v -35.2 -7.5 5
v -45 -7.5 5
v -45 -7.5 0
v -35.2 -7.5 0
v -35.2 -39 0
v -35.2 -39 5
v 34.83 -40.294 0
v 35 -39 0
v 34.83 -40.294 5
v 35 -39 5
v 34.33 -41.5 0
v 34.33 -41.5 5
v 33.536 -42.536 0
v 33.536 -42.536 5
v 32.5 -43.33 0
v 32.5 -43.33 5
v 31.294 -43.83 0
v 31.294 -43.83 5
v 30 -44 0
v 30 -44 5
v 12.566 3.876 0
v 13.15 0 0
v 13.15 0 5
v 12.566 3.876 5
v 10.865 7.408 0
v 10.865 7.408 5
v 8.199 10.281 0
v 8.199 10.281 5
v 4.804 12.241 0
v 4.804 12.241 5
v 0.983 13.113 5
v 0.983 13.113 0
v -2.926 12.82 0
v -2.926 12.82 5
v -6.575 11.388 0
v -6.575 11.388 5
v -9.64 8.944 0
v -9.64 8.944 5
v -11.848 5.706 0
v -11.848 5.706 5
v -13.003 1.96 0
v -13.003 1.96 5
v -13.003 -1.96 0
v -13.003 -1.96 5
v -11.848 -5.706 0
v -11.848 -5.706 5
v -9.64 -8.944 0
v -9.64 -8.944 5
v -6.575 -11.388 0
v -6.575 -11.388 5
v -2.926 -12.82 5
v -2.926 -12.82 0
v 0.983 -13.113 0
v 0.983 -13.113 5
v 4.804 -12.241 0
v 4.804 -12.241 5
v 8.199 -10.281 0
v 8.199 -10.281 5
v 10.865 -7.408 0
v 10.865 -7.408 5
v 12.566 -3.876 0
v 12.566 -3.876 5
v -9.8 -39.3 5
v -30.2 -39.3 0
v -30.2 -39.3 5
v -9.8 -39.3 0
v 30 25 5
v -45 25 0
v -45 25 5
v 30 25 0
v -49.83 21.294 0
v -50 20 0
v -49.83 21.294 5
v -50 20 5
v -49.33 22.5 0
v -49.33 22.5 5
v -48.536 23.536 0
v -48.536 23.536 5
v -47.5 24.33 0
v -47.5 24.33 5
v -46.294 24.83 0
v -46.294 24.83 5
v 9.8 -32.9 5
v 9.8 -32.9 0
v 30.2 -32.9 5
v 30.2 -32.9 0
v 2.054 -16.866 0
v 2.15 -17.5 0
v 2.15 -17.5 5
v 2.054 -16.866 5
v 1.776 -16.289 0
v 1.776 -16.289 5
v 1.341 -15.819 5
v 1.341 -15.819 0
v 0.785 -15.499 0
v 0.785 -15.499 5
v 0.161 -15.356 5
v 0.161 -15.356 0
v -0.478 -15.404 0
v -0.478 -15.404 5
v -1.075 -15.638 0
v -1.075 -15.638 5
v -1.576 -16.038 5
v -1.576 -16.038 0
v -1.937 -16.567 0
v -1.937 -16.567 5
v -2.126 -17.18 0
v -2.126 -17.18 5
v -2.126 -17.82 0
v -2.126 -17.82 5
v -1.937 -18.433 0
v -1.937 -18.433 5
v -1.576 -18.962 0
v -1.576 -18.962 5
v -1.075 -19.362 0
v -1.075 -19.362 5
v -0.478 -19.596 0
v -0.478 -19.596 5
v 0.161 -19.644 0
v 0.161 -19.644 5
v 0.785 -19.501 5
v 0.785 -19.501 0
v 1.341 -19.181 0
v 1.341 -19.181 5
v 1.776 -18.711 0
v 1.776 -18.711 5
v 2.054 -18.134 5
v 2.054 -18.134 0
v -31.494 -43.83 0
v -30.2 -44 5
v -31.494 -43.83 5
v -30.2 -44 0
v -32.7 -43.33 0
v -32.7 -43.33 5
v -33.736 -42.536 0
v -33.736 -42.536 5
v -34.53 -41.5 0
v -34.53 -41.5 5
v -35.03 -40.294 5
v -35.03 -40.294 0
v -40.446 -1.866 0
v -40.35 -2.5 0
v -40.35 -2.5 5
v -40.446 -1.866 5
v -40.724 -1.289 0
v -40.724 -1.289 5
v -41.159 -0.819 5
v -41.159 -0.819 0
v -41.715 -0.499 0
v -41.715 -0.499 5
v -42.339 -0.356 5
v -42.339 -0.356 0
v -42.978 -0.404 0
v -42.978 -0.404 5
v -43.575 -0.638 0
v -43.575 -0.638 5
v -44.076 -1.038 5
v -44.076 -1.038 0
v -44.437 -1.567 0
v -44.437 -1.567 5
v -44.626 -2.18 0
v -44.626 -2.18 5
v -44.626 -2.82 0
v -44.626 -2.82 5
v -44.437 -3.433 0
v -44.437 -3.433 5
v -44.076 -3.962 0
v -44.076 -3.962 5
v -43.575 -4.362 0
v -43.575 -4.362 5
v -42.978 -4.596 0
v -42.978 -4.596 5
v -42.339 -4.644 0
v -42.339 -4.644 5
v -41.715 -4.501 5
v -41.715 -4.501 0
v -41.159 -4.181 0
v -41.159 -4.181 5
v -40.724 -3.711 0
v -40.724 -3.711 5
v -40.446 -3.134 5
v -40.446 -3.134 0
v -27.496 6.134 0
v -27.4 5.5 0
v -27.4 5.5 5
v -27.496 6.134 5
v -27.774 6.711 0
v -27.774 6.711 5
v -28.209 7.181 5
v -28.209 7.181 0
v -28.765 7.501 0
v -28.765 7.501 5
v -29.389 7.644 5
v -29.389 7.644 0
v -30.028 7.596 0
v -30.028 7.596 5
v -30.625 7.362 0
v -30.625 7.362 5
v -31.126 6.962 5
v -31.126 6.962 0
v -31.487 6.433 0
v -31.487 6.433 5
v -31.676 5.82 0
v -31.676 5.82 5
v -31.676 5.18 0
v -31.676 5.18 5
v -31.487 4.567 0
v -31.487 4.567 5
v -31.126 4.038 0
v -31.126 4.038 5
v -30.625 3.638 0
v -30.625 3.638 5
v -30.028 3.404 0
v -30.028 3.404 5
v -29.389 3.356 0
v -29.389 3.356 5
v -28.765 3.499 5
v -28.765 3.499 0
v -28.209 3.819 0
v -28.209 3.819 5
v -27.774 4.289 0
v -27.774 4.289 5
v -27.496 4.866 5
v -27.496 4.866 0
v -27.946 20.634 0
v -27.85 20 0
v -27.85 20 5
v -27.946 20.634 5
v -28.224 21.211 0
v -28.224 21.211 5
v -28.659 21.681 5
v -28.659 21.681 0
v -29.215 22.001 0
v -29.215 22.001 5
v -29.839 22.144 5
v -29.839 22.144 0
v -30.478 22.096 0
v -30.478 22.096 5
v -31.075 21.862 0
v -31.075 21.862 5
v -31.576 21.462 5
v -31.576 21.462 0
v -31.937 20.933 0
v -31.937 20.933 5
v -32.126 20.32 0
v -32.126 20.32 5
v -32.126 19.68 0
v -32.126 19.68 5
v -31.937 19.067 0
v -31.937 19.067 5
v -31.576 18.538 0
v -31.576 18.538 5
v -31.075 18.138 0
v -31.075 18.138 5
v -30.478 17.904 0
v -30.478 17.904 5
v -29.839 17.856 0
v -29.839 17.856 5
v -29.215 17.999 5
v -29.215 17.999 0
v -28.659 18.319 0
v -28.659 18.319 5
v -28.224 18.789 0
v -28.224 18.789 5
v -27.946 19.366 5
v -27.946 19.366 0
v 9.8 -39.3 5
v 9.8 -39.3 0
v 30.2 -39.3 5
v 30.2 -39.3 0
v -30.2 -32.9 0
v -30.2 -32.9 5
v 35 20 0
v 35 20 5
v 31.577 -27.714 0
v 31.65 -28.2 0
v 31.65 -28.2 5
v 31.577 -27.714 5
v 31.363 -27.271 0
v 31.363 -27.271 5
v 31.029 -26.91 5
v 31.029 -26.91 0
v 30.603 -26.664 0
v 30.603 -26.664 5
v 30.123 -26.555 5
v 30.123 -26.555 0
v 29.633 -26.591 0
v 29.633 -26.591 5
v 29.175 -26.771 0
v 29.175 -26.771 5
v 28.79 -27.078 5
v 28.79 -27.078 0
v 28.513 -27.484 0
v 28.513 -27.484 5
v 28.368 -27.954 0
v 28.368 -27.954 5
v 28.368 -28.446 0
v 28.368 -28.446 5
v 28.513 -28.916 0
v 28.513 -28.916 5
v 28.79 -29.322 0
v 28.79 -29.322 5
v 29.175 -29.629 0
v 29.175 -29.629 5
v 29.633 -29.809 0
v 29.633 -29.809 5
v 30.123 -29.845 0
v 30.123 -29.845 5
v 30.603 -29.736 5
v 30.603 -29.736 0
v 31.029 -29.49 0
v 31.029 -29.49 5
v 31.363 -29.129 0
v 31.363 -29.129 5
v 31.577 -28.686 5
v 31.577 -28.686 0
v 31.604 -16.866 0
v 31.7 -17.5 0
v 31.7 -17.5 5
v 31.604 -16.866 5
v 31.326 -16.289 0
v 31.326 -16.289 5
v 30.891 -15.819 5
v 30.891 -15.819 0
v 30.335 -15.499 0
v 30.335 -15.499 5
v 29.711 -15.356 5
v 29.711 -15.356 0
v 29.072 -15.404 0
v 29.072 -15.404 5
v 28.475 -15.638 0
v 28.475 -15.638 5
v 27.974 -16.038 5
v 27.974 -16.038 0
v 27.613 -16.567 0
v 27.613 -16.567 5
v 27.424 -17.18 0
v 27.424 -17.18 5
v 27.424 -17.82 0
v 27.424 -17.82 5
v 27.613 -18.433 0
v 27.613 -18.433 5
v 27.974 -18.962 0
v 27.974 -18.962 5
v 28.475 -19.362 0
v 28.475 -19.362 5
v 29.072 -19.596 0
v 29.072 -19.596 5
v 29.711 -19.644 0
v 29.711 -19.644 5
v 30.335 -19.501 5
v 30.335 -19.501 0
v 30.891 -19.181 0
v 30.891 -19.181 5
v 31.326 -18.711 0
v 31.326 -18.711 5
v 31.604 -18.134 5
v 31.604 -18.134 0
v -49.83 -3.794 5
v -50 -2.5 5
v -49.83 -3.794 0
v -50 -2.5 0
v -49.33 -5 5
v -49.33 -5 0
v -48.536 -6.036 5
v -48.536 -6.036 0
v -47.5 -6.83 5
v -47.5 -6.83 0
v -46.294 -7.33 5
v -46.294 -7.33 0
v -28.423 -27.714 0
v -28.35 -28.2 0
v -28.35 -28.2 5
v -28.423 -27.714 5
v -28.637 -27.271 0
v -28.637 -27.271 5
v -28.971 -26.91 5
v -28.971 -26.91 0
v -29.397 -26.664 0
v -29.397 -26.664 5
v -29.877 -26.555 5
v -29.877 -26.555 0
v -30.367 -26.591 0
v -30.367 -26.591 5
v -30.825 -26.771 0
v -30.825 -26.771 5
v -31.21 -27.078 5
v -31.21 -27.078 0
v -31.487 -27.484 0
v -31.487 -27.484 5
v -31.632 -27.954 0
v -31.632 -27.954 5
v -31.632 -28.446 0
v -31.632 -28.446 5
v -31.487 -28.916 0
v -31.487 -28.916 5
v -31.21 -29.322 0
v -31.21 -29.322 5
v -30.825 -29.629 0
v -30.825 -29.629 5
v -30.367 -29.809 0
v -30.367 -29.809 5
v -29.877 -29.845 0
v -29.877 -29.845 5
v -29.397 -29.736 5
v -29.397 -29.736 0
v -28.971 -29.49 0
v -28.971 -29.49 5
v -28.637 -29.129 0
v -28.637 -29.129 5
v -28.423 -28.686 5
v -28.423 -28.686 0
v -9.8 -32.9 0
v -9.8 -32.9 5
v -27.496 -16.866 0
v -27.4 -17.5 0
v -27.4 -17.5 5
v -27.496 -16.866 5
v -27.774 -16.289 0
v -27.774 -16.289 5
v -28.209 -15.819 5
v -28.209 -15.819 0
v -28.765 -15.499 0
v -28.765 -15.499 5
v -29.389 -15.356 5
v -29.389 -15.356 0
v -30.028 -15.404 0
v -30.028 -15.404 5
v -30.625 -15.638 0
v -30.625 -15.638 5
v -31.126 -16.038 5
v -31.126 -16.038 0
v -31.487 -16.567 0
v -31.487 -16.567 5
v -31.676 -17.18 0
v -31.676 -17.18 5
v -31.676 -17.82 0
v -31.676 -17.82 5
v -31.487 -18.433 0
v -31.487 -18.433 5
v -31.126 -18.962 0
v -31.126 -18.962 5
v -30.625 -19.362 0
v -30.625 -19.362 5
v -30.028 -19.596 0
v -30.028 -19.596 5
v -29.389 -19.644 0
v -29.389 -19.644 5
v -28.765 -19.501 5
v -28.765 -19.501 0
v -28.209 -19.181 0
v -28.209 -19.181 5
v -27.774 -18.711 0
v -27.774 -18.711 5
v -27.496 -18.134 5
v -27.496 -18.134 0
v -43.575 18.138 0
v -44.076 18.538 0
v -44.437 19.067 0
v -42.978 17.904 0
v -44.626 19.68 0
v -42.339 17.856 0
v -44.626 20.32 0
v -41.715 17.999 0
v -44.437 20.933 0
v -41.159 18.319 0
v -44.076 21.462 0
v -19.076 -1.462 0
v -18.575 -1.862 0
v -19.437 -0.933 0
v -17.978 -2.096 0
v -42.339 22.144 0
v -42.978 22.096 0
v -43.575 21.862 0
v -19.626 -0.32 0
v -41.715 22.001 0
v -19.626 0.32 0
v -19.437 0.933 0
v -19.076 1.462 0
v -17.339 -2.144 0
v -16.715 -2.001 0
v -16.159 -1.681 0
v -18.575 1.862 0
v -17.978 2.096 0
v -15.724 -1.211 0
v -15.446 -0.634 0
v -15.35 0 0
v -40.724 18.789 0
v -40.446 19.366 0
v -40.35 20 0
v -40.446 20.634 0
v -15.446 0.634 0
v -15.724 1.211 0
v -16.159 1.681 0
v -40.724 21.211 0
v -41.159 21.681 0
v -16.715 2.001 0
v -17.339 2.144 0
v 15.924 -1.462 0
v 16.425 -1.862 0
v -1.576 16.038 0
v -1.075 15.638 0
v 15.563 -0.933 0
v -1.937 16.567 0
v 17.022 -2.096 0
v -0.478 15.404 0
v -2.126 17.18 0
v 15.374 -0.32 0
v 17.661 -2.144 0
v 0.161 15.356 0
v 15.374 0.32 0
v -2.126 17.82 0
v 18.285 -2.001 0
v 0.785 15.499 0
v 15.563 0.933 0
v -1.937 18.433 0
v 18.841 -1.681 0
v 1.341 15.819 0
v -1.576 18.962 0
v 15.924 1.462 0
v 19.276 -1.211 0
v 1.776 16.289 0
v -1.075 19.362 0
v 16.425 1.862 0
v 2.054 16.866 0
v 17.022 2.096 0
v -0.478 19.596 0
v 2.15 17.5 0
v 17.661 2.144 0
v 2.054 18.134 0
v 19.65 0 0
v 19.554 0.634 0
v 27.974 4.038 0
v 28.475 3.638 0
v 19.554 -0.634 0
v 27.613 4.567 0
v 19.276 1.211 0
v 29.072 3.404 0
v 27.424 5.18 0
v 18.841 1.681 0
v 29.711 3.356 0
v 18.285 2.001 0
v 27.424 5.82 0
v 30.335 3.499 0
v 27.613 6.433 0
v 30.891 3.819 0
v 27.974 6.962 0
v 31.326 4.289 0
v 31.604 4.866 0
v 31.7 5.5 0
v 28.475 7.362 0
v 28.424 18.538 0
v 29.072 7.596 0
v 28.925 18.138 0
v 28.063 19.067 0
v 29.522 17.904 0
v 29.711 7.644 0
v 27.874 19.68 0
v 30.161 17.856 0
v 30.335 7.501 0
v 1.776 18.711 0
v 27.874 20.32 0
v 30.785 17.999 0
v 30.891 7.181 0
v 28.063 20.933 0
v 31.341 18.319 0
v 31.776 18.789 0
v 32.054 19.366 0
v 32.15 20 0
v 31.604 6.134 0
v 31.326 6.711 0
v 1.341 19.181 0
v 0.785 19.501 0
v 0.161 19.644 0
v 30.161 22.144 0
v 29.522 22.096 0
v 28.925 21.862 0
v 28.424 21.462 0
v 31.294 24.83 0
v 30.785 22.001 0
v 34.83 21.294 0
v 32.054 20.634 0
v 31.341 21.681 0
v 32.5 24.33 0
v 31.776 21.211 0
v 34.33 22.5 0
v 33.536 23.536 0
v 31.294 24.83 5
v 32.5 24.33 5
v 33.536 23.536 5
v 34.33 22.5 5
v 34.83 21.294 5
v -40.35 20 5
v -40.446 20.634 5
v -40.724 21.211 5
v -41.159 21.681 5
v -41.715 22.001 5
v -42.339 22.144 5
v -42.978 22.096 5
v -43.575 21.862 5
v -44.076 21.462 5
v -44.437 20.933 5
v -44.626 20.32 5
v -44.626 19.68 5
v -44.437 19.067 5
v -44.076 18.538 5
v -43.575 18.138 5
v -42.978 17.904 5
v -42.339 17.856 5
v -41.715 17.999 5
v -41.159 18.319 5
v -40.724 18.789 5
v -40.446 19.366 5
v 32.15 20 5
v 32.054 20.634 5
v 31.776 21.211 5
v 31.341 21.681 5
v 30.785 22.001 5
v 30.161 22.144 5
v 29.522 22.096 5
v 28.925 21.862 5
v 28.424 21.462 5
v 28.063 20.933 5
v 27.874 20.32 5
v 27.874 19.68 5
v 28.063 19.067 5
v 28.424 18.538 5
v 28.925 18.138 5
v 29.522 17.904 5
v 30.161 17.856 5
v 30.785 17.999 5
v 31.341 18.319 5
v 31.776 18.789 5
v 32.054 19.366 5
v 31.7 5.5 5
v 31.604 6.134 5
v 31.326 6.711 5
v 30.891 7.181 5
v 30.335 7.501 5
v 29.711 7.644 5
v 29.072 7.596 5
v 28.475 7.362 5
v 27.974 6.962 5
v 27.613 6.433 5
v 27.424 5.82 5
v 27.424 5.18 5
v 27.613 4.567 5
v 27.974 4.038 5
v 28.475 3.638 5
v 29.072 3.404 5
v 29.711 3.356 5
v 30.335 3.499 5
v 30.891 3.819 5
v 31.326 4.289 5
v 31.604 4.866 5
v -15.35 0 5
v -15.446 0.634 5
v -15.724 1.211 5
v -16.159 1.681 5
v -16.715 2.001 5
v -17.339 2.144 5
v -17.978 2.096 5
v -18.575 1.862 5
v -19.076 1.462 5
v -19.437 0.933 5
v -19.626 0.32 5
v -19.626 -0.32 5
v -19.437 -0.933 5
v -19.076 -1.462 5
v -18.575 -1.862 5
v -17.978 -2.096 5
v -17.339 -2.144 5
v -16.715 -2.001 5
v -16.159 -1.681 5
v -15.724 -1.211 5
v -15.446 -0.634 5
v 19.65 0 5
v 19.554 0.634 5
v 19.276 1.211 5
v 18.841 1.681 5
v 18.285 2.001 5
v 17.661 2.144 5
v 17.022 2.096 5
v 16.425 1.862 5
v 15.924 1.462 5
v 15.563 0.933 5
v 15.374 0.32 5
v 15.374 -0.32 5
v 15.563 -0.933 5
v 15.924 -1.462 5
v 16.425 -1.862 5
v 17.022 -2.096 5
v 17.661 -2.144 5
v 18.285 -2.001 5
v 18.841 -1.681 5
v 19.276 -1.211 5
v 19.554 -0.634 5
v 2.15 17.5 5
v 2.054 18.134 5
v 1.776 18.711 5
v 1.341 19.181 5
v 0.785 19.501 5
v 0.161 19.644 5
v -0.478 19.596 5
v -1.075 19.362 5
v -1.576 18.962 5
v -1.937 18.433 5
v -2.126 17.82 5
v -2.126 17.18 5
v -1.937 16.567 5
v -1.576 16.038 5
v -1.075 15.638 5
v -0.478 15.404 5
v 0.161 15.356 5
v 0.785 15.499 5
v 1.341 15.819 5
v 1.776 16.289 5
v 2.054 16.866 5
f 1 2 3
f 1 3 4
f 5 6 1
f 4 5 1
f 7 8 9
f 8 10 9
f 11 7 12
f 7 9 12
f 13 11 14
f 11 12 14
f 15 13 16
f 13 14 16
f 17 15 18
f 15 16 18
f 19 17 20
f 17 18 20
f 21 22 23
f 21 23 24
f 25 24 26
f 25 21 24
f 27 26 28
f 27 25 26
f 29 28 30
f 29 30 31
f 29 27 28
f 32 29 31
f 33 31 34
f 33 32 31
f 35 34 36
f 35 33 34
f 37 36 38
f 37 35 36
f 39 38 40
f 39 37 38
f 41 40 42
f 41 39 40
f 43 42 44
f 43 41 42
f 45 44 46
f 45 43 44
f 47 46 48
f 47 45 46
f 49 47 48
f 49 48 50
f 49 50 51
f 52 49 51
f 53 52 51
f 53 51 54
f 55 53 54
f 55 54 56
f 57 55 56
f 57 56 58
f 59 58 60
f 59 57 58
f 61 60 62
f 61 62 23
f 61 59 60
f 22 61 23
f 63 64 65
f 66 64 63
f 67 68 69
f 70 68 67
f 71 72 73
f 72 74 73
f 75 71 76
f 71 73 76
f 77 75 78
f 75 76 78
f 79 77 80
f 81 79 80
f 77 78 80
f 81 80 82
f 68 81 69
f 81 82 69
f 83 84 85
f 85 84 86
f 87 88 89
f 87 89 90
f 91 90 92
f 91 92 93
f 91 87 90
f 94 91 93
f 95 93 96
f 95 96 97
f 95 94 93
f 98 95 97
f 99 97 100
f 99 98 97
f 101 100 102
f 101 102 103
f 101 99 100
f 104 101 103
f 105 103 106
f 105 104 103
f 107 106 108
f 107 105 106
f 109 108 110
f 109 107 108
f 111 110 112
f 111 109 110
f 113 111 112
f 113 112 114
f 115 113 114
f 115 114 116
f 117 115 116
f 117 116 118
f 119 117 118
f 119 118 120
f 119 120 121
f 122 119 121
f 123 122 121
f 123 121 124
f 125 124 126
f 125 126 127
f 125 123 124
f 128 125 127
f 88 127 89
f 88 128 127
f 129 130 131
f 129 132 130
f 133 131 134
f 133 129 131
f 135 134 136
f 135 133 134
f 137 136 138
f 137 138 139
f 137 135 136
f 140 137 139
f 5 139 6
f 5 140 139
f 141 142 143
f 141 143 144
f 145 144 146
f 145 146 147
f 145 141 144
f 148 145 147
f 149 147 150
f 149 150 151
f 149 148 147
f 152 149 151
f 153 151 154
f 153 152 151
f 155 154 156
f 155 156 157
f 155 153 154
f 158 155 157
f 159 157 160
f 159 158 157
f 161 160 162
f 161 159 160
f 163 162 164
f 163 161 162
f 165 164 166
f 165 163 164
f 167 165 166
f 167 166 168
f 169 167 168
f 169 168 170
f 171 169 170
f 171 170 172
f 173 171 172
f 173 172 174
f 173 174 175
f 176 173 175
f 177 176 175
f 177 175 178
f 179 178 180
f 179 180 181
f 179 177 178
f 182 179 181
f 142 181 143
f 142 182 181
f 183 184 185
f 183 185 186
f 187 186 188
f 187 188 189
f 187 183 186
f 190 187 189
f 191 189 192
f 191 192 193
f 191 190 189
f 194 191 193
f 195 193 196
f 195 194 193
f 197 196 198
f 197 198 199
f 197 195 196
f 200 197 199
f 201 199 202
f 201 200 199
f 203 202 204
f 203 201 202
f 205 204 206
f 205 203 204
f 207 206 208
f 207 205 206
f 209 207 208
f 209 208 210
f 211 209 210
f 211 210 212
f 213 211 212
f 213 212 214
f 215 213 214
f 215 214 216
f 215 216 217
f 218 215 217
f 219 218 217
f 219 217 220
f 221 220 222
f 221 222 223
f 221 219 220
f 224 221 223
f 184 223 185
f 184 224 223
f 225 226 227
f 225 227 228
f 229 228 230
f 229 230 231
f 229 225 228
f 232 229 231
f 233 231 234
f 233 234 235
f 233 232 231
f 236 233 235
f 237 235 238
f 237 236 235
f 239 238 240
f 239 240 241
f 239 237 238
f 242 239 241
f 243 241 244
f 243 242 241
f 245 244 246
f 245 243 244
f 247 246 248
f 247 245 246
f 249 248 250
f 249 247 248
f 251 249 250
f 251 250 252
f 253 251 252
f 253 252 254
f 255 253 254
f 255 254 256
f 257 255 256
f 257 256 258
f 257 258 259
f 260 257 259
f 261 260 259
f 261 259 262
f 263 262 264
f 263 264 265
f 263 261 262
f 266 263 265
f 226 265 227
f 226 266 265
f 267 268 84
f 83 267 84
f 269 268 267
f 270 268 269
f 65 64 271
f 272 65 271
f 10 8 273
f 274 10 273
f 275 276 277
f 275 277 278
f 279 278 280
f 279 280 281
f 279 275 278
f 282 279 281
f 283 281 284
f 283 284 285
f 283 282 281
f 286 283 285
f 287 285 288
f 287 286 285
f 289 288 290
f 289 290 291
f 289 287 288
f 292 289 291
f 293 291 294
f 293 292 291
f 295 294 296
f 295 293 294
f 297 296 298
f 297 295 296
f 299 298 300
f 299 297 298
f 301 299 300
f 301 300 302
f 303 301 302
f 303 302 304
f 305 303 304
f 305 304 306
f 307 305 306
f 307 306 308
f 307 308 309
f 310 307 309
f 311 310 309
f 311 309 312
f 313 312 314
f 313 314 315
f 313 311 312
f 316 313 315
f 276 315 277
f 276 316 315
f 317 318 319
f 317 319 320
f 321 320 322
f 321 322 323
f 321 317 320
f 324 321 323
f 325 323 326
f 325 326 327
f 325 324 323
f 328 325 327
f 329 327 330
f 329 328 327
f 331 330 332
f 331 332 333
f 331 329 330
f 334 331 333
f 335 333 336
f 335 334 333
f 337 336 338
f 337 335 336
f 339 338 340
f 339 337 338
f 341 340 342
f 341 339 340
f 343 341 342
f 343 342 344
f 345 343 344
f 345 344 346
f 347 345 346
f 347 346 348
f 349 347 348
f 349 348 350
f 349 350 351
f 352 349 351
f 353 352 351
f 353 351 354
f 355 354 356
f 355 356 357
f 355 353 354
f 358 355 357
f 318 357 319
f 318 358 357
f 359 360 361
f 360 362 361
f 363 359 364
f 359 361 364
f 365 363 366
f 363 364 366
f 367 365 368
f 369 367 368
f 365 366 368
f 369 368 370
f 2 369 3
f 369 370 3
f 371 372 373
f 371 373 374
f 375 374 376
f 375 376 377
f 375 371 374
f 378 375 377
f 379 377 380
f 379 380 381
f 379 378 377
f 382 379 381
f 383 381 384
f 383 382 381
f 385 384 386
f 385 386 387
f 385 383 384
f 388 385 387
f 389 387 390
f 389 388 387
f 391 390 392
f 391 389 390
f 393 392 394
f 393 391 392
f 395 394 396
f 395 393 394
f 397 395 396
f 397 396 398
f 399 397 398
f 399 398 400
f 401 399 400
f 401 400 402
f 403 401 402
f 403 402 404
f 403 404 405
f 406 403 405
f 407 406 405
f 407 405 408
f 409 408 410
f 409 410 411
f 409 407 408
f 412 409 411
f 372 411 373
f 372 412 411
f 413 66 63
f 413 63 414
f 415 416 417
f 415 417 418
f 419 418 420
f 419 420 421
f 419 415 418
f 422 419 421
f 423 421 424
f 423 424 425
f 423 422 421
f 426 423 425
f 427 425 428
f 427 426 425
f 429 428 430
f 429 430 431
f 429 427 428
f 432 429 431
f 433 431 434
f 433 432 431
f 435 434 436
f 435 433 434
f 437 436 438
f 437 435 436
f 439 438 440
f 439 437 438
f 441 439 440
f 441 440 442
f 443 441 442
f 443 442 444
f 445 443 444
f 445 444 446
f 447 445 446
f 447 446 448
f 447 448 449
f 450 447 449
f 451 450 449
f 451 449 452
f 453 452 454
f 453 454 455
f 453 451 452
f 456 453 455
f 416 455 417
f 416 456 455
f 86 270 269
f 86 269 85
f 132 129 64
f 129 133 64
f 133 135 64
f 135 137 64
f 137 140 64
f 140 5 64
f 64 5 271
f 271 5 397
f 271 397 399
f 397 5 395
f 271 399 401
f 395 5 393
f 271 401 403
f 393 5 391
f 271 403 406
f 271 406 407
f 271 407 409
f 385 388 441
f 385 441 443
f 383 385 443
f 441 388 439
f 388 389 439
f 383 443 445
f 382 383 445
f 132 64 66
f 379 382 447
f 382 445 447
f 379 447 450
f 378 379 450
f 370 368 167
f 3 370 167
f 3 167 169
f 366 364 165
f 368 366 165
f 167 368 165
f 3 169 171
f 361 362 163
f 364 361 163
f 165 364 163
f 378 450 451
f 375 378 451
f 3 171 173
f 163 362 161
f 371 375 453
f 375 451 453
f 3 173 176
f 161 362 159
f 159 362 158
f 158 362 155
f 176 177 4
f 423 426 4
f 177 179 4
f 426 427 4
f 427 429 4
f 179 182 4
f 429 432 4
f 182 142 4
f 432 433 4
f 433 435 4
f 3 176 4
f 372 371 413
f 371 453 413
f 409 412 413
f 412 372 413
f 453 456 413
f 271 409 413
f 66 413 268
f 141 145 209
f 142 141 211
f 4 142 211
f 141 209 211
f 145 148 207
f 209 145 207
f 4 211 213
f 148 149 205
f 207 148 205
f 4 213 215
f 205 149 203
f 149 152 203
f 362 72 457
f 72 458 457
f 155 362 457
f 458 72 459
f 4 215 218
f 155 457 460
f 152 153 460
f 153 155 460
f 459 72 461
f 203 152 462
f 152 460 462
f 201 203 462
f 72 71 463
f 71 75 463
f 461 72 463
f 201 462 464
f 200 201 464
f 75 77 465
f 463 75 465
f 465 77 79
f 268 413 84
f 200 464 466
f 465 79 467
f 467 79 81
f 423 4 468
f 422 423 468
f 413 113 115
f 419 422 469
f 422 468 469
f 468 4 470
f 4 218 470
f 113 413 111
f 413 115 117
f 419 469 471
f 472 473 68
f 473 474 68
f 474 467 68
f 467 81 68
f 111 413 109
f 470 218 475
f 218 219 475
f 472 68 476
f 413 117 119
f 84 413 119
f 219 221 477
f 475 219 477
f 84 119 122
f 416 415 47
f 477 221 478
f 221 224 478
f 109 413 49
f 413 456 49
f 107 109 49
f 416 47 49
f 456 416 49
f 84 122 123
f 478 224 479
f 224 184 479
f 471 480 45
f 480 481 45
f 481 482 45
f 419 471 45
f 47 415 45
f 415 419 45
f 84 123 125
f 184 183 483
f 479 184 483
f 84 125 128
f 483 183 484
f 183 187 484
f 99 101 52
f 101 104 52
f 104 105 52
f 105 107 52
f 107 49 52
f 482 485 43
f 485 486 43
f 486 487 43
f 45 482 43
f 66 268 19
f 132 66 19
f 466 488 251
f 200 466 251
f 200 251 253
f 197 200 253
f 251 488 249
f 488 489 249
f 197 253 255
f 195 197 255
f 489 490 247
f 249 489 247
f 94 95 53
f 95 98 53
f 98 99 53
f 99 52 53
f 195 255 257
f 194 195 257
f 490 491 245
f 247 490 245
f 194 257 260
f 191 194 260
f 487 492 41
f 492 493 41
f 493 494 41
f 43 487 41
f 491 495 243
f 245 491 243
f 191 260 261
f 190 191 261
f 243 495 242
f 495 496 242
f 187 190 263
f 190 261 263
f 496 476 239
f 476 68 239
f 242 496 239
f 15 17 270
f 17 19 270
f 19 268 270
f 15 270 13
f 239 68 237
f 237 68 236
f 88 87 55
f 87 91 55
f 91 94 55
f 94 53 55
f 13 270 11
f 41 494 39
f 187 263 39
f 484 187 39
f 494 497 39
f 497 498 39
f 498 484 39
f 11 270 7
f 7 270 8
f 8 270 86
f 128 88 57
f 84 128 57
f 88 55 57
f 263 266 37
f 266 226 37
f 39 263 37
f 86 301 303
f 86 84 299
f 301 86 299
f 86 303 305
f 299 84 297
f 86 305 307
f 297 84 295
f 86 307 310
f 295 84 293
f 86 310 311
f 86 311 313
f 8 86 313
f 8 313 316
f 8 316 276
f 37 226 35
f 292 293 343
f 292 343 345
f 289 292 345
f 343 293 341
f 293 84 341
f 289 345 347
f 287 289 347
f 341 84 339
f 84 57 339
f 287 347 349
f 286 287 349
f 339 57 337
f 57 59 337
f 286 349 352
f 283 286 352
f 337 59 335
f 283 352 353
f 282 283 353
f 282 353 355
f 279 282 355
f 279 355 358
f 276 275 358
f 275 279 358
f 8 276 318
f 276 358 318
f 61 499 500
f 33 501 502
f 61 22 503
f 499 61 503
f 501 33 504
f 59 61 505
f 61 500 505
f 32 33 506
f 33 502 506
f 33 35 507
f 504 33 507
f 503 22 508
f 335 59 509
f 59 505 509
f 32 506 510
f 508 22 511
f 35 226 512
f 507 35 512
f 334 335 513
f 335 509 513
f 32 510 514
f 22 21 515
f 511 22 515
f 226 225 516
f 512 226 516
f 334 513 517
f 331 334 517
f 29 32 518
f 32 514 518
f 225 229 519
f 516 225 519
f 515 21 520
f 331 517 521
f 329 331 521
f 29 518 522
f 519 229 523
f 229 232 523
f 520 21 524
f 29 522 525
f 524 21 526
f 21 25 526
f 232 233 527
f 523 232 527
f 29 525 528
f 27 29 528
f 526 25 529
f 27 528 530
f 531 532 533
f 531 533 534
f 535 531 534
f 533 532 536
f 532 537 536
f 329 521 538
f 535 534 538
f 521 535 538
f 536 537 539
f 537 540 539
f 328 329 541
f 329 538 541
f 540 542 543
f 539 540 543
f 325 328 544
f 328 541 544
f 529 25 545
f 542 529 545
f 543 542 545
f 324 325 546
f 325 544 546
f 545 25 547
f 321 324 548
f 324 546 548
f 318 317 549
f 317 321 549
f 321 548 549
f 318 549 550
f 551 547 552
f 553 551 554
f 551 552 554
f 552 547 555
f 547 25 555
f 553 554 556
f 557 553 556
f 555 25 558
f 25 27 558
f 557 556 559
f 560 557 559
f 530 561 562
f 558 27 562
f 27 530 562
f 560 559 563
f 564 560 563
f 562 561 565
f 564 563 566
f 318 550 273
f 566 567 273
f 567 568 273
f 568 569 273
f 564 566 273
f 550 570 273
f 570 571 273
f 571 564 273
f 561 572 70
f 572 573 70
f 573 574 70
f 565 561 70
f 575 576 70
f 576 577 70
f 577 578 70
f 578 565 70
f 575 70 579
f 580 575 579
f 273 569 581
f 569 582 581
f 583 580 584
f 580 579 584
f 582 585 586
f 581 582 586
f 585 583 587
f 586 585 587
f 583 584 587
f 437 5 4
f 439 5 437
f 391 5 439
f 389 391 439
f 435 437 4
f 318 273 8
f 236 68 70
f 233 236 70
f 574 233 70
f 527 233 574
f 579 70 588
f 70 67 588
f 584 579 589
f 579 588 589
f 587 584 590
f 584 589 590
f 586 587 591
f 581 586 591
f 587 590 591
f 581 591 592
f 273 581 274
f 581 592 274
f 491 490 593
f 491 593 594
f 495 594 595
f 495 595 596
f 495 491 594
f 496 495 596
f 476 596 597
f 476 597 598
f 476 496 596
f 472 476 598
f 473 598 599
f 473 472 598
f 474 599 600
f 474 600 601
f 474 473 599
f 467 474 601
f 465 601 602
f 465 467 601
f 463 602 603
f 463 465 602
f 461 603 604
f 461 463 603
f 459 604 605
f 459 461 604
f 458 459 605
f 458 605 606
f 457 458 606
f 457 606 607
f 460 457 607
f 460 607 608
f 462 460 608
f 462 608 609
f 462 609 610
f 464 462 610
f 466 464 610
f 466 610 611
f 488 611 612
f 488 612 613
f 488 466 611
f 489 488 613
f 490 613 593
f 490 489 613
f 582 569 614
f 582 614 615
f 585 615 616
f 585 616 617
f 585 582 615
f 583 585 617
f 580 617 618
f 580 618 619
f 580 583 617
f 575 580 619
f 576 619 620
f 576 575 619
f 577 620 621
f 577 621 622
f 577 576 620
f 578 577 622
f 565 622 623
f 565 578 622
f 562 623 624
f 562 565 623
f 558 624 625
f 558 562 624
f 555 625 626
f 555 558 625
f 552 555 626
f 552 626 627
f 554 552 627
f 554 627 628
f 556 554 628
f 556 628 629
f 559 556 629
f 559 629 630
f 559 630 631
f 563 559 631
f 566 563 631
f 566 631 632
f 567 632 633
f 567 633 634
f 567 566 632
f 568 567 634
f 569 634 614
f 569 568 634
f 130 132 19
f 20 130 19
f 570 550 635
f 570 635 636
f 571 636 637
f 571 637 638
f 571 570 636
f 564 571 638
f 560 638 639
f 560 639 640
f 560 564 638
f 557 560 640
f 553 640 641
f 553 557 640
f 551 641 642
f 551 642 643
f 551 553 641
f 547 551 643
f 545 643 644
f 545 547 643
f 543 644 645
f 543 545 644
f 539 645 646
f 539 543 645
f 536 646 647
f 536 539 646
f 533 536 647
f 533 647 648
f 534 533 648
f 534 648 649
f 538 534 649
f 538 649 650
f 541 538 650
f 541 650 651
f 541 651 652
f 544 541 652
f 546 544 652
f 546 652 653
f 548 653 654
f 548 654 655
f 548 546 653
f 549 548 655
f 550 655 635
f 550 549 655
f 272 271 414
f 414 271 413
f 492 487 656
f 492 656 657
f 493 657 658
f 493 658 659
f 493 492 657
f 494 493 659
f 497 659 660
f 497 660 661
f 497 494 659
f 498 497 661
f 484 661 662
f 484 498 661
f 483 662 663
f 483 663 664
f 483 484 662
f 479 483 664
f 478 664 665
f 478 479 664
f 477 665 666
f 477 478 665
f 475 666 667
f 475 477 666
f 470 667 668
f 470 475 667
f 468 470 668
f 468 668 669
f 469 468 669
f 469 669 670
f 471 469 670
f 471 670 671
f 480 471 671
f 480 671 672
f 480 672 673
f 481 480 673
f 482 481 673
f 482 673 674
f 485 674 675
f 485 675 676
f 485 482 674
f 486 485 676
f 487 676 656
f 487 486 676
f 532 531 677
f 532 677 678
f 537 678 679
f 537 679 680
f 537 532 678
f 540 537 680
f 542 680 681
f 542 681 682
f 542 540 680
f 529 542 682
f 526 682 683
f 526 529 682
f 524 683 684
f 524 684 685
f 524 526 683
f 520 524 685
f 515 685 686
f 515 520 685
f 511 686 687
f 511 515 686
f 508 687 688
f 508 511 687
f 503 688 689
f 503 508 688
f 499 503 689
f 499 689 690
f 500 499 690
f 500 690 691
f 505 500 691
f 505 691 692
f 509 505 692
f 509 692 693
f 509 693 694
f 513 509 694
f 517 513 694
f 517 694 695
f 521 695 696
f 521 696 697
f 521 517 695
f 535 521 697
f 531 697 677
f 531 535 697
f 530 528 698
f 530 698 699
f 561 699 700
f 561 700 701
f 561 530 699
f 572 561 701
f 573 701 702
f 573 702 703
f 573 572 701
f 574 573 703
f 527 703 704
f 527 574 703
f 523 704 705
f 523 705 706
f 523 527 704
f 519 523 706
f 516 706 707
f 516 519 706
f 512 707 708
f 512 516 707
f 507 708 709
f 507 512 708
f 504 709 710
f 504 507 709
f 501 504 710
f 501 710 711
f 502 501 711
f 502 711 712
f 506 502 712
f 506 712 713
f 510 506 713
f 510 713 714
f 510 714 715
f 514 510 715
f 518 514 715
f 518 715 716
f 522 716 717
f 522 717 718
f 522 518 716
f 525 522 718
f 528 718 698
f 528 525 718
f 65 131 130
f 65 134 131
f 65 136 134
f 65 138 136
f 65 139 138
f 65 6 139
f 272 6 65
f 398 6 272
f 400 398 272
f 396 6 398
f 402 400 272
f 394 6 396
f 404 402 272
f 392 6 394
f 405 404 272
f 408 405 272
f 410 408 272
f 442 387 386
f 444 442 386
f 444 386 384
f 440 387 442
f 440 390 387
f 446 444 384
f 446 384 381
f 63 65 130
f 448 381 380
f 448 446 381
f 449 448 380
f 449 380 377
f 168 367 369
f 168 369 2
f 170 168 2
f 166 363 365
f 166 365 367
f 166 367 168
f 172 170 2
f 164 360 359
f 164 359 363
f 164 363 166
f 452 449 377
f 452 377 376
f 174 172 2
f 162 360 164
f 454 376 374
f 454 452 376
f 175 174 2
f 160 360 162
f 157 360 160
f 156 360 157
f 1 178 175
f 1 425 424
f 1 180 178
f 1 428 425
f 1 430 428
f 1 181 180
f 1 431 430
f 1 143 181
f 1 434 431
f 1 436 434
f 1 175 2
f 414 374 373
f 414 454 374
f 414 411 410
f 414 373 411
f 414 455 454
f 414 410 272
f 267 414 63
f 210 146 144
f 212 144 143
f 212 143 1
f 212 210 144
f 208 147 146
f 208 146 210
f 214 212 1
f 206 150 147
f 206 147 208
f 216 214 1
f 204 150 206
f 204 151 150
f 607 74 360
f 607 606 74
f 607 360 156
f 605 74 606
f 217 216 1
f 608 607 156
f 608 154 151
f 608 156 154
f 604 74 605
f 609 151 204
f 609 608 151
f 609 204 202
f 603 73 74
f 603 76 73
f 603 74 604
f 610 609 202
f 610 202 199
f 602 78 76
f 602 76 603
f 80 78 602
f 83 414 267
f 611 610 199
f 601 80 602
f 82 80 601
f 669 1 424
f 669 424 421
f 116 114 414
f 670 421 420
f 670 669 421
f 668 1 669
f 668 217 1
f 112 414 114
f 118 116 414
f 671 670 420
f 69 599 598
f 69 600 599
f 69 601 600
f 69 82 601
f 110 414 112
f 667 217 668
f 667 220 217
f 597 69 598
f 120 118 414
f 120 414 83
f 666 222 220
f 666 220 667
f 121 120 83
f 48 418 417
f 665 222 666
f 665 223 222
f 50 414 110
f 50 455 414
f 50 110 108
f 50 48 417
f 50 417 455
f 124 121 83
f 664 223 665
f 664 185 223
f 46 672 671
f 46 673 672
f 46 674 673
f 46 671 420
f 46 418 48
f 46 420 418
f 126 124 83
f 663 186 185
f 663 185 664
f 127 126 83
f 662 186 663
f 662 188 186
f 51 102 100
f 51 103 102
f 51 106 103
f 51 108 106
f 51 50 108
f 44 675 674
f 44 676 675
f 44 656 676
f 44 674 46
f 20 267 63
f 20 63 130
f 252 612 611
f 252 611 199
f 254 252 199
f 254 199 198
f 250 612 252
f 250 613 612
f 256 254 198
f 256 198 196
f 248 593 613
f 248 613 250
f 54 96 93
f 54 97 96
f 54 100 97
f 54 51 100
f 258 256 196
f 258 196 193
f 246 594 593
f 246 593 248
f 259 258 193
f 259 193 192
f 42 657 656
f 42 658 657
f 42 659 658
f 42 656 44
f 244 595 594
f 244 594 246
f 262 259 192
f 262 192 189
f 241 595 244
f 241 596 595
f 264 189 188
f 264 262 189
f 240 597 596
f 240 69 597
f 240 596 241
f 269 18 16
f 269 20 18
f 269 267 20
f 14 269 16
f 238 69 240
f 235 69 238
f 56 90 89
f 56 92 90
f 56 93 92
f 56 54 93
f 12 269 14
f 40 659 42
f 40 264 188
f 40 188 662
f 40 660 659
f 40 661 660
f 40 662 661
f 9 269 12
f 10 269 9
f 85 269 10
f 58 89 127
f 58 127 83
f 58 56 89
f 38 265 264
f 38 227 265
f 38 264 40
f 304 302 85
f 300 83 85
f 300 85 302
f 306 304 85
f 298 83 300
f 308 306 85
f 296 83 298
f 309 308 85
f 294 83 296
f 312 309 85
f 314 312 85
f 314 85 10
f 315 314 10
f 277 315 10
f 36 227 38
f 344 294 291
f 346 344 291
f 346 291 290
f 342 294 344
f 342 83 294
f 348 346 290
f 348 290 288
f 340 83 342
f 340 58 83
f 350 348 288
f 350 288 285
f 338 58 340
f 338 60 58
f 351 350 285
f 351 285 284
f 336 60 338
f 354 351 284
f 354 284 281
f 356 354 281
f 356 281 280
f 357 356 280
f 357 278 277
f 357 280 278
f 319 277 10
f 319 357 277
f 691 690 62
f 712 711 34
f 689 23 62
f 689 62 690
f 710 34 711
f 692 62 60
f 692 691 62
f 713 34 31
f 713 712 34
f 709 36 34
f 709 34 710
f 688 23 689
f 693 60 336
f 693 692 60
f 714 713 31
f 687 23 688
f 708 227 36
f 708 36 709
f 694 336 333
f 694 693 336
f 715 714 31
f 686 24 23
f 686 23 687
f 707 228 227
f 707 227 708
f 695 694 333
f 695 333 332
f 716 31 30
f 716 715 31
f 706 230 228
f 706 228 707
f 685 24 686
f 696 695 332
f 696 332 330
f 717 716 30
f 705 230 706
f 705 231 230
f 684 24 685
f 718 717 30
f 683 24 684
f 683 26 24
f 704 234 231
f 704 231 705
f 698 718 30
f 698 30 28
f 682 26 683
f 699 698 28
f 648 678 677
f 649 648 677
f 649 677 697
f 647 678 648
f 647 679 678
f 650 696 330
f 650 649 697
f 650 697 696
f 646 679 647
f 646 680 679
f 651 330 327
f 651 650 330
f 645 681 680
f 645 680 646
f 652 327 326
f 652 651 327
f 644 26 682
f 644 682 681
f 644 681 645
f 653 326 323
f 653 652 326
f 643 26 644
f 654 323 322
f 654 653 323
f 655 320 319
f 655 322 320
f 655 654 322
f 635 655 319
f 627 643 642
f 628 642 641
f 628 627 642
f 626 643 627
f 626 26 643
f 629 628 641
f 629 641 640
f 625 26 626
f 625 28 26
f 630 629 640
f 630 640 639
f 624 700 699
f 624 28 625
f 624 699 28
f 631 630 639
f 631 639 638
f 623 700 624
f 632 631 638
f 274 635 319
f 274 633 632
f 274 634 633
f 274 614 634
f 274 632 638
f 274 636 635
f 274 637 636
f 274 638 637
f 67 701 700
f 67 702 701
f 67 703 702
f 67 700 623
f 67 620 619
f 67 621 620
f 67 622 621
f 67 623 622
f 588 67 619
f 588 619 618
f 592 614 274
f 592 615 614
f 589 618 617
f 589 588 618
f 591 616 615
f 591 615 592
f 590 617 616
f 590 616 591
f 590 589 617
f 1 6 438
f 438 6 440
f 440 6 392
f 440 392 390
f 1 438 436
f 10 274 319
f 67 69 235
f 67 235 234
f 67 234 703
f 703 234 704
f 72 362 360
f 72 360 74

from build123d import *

# Parameters (mm, degrees)
SKETCH_1_W          = 70
SKETCH_1_H          = 69
SKETCH_1_R          = 1.65
SKETCH_1_W_2        = 20.4
SKETCH_1_H_2        = 6.4
SKETCH_1_R_2        = 2.15
SKETCH_1_R_3        = 13.15
SKETCH_1_W_3        = 15
EXTRUDE_1_DEPTH     = 5
SKETCH_2_W          = 14.8
SKETCH_2_H          = 36.5
CUT_EXTRUDE_1_DEPTH = 67.790717918
FILLET_1_R          = 5


with BuildPart() as part:
    # ｽｹｯﾁ1 → ﾎﾞｽ - 押し出し1 (new body)
    # profile 1 of 2: a face of its own
    with BuildSketch(Plane.XY):
        with Locations((0, -9.5)):
            Rectangle(SKETCH_1_W, SKETCH_1_H)
        with Locations((-30, -28.2)):
            Circle(SKETCH_1_R, mode=Mode.SUBTRACT)
        with Locations((-20, -36.1)):
            Rectangle(SKETCH_1_W_2, SKETCH_1_H_2, mode=Mode.SUBTRACT)
        with Locations((-29.55, -17.5)):
            Circle(SKETCH_1_R_2, mode=Mode.SUBTRACT)
        with Locations((20, -36.1)):
            Rectangle(SKETCH_1_W_2, SKETCH_1_H_2, mode=Mode.SUBTRACT)
        with Locations((30, -28.2)):
            Circle(SKETCH_1_R, mode=Mode.SUBTRACT)
        with Locations((0, -17.5)):
            Circle(SKETCH_1_R_2, mode=Mode.SUBTRACT)
        with Locations((29.55, -17.5)):
            Circle(SKETCH_1_R_2, mode=Mode.SUBTRACT)
        with Locations((-29.55, 5.5)):
            Circle(SKETCH_1_R_2, mode=Mode.SUBTRACT)
        with Locations((-17.5, 0)):
            Circle(SKETCH_1_R_2, mode=Mode.SUBTRACT)
        with Locations((-30, 20)):
            Circle(SKETCH_1_R_2, mode=Mode.SUBTRACT)
        Circle(SKETCH_1_R_3, mode=Mode.SUBTRACT)
        with Locations((17.5, 0)):
            Circle(SKETCH_1_R_2, mode=Mode.SUBTRACT)
        with Locations((29.55, 5.5)):
            Circle(SKETCH_1_R_2, mode=Mode.SUBTRACT)
        with Locations((0, 17.5)):
            Circle(SKETCH_1_R_2, mode=Mode.SUBTRACT)
        with Locations((30, 20)):
            Circle(SKETCH_1_R_2, mode=Mode.SUBTRACT)
    # profile 2 of 2: a face of its own
    with BuildSketch(Plane.XY):
        with Locations((-42.5, -9.5)):
            Rectangle(SKETCH_1_W_3, SKETCH_1_H)
        with Locations((-42.5, -2.5)):
            Circle(SKETCH_1_R_2, mode=Mode.SUBTRACT)
        with Locations((-42.5, 20)):
            Circle(SKETCH_1_R_2, mode=Mode.SUBTRACT)
    extrude(amount=EXTRUDE_1_DEPTH)

    # ｽｹｯﾁ2 → ｶｯﾄ - 押し出し1 (cut, through all)
    with BuildSketch(Plane.XY.offset(5)):
        with Locations((-42.6, -25.75)):
            Rectangle(SKETCH_2_W, SKETCH_2_H)
    extrude(amount=-CUT_EXTRUDE_1_DEPTH, mode=Mode.SUBTRACT)

    # ﾌｨﾚｯﾄ1
    fillet_1_edges = [part.edges().sort_by_distance(p)[0] for p in [
        (-50, 25, 2.5),
        (35, 25, 2.5),
        (35, -44, 2.5),
        (-50, -7.5, 2.5),
        (-35.2, -44, 2.5),
    ]]
    fillet(fillet_1_edges, radius=FILLET_1_R)


solid = part.part
